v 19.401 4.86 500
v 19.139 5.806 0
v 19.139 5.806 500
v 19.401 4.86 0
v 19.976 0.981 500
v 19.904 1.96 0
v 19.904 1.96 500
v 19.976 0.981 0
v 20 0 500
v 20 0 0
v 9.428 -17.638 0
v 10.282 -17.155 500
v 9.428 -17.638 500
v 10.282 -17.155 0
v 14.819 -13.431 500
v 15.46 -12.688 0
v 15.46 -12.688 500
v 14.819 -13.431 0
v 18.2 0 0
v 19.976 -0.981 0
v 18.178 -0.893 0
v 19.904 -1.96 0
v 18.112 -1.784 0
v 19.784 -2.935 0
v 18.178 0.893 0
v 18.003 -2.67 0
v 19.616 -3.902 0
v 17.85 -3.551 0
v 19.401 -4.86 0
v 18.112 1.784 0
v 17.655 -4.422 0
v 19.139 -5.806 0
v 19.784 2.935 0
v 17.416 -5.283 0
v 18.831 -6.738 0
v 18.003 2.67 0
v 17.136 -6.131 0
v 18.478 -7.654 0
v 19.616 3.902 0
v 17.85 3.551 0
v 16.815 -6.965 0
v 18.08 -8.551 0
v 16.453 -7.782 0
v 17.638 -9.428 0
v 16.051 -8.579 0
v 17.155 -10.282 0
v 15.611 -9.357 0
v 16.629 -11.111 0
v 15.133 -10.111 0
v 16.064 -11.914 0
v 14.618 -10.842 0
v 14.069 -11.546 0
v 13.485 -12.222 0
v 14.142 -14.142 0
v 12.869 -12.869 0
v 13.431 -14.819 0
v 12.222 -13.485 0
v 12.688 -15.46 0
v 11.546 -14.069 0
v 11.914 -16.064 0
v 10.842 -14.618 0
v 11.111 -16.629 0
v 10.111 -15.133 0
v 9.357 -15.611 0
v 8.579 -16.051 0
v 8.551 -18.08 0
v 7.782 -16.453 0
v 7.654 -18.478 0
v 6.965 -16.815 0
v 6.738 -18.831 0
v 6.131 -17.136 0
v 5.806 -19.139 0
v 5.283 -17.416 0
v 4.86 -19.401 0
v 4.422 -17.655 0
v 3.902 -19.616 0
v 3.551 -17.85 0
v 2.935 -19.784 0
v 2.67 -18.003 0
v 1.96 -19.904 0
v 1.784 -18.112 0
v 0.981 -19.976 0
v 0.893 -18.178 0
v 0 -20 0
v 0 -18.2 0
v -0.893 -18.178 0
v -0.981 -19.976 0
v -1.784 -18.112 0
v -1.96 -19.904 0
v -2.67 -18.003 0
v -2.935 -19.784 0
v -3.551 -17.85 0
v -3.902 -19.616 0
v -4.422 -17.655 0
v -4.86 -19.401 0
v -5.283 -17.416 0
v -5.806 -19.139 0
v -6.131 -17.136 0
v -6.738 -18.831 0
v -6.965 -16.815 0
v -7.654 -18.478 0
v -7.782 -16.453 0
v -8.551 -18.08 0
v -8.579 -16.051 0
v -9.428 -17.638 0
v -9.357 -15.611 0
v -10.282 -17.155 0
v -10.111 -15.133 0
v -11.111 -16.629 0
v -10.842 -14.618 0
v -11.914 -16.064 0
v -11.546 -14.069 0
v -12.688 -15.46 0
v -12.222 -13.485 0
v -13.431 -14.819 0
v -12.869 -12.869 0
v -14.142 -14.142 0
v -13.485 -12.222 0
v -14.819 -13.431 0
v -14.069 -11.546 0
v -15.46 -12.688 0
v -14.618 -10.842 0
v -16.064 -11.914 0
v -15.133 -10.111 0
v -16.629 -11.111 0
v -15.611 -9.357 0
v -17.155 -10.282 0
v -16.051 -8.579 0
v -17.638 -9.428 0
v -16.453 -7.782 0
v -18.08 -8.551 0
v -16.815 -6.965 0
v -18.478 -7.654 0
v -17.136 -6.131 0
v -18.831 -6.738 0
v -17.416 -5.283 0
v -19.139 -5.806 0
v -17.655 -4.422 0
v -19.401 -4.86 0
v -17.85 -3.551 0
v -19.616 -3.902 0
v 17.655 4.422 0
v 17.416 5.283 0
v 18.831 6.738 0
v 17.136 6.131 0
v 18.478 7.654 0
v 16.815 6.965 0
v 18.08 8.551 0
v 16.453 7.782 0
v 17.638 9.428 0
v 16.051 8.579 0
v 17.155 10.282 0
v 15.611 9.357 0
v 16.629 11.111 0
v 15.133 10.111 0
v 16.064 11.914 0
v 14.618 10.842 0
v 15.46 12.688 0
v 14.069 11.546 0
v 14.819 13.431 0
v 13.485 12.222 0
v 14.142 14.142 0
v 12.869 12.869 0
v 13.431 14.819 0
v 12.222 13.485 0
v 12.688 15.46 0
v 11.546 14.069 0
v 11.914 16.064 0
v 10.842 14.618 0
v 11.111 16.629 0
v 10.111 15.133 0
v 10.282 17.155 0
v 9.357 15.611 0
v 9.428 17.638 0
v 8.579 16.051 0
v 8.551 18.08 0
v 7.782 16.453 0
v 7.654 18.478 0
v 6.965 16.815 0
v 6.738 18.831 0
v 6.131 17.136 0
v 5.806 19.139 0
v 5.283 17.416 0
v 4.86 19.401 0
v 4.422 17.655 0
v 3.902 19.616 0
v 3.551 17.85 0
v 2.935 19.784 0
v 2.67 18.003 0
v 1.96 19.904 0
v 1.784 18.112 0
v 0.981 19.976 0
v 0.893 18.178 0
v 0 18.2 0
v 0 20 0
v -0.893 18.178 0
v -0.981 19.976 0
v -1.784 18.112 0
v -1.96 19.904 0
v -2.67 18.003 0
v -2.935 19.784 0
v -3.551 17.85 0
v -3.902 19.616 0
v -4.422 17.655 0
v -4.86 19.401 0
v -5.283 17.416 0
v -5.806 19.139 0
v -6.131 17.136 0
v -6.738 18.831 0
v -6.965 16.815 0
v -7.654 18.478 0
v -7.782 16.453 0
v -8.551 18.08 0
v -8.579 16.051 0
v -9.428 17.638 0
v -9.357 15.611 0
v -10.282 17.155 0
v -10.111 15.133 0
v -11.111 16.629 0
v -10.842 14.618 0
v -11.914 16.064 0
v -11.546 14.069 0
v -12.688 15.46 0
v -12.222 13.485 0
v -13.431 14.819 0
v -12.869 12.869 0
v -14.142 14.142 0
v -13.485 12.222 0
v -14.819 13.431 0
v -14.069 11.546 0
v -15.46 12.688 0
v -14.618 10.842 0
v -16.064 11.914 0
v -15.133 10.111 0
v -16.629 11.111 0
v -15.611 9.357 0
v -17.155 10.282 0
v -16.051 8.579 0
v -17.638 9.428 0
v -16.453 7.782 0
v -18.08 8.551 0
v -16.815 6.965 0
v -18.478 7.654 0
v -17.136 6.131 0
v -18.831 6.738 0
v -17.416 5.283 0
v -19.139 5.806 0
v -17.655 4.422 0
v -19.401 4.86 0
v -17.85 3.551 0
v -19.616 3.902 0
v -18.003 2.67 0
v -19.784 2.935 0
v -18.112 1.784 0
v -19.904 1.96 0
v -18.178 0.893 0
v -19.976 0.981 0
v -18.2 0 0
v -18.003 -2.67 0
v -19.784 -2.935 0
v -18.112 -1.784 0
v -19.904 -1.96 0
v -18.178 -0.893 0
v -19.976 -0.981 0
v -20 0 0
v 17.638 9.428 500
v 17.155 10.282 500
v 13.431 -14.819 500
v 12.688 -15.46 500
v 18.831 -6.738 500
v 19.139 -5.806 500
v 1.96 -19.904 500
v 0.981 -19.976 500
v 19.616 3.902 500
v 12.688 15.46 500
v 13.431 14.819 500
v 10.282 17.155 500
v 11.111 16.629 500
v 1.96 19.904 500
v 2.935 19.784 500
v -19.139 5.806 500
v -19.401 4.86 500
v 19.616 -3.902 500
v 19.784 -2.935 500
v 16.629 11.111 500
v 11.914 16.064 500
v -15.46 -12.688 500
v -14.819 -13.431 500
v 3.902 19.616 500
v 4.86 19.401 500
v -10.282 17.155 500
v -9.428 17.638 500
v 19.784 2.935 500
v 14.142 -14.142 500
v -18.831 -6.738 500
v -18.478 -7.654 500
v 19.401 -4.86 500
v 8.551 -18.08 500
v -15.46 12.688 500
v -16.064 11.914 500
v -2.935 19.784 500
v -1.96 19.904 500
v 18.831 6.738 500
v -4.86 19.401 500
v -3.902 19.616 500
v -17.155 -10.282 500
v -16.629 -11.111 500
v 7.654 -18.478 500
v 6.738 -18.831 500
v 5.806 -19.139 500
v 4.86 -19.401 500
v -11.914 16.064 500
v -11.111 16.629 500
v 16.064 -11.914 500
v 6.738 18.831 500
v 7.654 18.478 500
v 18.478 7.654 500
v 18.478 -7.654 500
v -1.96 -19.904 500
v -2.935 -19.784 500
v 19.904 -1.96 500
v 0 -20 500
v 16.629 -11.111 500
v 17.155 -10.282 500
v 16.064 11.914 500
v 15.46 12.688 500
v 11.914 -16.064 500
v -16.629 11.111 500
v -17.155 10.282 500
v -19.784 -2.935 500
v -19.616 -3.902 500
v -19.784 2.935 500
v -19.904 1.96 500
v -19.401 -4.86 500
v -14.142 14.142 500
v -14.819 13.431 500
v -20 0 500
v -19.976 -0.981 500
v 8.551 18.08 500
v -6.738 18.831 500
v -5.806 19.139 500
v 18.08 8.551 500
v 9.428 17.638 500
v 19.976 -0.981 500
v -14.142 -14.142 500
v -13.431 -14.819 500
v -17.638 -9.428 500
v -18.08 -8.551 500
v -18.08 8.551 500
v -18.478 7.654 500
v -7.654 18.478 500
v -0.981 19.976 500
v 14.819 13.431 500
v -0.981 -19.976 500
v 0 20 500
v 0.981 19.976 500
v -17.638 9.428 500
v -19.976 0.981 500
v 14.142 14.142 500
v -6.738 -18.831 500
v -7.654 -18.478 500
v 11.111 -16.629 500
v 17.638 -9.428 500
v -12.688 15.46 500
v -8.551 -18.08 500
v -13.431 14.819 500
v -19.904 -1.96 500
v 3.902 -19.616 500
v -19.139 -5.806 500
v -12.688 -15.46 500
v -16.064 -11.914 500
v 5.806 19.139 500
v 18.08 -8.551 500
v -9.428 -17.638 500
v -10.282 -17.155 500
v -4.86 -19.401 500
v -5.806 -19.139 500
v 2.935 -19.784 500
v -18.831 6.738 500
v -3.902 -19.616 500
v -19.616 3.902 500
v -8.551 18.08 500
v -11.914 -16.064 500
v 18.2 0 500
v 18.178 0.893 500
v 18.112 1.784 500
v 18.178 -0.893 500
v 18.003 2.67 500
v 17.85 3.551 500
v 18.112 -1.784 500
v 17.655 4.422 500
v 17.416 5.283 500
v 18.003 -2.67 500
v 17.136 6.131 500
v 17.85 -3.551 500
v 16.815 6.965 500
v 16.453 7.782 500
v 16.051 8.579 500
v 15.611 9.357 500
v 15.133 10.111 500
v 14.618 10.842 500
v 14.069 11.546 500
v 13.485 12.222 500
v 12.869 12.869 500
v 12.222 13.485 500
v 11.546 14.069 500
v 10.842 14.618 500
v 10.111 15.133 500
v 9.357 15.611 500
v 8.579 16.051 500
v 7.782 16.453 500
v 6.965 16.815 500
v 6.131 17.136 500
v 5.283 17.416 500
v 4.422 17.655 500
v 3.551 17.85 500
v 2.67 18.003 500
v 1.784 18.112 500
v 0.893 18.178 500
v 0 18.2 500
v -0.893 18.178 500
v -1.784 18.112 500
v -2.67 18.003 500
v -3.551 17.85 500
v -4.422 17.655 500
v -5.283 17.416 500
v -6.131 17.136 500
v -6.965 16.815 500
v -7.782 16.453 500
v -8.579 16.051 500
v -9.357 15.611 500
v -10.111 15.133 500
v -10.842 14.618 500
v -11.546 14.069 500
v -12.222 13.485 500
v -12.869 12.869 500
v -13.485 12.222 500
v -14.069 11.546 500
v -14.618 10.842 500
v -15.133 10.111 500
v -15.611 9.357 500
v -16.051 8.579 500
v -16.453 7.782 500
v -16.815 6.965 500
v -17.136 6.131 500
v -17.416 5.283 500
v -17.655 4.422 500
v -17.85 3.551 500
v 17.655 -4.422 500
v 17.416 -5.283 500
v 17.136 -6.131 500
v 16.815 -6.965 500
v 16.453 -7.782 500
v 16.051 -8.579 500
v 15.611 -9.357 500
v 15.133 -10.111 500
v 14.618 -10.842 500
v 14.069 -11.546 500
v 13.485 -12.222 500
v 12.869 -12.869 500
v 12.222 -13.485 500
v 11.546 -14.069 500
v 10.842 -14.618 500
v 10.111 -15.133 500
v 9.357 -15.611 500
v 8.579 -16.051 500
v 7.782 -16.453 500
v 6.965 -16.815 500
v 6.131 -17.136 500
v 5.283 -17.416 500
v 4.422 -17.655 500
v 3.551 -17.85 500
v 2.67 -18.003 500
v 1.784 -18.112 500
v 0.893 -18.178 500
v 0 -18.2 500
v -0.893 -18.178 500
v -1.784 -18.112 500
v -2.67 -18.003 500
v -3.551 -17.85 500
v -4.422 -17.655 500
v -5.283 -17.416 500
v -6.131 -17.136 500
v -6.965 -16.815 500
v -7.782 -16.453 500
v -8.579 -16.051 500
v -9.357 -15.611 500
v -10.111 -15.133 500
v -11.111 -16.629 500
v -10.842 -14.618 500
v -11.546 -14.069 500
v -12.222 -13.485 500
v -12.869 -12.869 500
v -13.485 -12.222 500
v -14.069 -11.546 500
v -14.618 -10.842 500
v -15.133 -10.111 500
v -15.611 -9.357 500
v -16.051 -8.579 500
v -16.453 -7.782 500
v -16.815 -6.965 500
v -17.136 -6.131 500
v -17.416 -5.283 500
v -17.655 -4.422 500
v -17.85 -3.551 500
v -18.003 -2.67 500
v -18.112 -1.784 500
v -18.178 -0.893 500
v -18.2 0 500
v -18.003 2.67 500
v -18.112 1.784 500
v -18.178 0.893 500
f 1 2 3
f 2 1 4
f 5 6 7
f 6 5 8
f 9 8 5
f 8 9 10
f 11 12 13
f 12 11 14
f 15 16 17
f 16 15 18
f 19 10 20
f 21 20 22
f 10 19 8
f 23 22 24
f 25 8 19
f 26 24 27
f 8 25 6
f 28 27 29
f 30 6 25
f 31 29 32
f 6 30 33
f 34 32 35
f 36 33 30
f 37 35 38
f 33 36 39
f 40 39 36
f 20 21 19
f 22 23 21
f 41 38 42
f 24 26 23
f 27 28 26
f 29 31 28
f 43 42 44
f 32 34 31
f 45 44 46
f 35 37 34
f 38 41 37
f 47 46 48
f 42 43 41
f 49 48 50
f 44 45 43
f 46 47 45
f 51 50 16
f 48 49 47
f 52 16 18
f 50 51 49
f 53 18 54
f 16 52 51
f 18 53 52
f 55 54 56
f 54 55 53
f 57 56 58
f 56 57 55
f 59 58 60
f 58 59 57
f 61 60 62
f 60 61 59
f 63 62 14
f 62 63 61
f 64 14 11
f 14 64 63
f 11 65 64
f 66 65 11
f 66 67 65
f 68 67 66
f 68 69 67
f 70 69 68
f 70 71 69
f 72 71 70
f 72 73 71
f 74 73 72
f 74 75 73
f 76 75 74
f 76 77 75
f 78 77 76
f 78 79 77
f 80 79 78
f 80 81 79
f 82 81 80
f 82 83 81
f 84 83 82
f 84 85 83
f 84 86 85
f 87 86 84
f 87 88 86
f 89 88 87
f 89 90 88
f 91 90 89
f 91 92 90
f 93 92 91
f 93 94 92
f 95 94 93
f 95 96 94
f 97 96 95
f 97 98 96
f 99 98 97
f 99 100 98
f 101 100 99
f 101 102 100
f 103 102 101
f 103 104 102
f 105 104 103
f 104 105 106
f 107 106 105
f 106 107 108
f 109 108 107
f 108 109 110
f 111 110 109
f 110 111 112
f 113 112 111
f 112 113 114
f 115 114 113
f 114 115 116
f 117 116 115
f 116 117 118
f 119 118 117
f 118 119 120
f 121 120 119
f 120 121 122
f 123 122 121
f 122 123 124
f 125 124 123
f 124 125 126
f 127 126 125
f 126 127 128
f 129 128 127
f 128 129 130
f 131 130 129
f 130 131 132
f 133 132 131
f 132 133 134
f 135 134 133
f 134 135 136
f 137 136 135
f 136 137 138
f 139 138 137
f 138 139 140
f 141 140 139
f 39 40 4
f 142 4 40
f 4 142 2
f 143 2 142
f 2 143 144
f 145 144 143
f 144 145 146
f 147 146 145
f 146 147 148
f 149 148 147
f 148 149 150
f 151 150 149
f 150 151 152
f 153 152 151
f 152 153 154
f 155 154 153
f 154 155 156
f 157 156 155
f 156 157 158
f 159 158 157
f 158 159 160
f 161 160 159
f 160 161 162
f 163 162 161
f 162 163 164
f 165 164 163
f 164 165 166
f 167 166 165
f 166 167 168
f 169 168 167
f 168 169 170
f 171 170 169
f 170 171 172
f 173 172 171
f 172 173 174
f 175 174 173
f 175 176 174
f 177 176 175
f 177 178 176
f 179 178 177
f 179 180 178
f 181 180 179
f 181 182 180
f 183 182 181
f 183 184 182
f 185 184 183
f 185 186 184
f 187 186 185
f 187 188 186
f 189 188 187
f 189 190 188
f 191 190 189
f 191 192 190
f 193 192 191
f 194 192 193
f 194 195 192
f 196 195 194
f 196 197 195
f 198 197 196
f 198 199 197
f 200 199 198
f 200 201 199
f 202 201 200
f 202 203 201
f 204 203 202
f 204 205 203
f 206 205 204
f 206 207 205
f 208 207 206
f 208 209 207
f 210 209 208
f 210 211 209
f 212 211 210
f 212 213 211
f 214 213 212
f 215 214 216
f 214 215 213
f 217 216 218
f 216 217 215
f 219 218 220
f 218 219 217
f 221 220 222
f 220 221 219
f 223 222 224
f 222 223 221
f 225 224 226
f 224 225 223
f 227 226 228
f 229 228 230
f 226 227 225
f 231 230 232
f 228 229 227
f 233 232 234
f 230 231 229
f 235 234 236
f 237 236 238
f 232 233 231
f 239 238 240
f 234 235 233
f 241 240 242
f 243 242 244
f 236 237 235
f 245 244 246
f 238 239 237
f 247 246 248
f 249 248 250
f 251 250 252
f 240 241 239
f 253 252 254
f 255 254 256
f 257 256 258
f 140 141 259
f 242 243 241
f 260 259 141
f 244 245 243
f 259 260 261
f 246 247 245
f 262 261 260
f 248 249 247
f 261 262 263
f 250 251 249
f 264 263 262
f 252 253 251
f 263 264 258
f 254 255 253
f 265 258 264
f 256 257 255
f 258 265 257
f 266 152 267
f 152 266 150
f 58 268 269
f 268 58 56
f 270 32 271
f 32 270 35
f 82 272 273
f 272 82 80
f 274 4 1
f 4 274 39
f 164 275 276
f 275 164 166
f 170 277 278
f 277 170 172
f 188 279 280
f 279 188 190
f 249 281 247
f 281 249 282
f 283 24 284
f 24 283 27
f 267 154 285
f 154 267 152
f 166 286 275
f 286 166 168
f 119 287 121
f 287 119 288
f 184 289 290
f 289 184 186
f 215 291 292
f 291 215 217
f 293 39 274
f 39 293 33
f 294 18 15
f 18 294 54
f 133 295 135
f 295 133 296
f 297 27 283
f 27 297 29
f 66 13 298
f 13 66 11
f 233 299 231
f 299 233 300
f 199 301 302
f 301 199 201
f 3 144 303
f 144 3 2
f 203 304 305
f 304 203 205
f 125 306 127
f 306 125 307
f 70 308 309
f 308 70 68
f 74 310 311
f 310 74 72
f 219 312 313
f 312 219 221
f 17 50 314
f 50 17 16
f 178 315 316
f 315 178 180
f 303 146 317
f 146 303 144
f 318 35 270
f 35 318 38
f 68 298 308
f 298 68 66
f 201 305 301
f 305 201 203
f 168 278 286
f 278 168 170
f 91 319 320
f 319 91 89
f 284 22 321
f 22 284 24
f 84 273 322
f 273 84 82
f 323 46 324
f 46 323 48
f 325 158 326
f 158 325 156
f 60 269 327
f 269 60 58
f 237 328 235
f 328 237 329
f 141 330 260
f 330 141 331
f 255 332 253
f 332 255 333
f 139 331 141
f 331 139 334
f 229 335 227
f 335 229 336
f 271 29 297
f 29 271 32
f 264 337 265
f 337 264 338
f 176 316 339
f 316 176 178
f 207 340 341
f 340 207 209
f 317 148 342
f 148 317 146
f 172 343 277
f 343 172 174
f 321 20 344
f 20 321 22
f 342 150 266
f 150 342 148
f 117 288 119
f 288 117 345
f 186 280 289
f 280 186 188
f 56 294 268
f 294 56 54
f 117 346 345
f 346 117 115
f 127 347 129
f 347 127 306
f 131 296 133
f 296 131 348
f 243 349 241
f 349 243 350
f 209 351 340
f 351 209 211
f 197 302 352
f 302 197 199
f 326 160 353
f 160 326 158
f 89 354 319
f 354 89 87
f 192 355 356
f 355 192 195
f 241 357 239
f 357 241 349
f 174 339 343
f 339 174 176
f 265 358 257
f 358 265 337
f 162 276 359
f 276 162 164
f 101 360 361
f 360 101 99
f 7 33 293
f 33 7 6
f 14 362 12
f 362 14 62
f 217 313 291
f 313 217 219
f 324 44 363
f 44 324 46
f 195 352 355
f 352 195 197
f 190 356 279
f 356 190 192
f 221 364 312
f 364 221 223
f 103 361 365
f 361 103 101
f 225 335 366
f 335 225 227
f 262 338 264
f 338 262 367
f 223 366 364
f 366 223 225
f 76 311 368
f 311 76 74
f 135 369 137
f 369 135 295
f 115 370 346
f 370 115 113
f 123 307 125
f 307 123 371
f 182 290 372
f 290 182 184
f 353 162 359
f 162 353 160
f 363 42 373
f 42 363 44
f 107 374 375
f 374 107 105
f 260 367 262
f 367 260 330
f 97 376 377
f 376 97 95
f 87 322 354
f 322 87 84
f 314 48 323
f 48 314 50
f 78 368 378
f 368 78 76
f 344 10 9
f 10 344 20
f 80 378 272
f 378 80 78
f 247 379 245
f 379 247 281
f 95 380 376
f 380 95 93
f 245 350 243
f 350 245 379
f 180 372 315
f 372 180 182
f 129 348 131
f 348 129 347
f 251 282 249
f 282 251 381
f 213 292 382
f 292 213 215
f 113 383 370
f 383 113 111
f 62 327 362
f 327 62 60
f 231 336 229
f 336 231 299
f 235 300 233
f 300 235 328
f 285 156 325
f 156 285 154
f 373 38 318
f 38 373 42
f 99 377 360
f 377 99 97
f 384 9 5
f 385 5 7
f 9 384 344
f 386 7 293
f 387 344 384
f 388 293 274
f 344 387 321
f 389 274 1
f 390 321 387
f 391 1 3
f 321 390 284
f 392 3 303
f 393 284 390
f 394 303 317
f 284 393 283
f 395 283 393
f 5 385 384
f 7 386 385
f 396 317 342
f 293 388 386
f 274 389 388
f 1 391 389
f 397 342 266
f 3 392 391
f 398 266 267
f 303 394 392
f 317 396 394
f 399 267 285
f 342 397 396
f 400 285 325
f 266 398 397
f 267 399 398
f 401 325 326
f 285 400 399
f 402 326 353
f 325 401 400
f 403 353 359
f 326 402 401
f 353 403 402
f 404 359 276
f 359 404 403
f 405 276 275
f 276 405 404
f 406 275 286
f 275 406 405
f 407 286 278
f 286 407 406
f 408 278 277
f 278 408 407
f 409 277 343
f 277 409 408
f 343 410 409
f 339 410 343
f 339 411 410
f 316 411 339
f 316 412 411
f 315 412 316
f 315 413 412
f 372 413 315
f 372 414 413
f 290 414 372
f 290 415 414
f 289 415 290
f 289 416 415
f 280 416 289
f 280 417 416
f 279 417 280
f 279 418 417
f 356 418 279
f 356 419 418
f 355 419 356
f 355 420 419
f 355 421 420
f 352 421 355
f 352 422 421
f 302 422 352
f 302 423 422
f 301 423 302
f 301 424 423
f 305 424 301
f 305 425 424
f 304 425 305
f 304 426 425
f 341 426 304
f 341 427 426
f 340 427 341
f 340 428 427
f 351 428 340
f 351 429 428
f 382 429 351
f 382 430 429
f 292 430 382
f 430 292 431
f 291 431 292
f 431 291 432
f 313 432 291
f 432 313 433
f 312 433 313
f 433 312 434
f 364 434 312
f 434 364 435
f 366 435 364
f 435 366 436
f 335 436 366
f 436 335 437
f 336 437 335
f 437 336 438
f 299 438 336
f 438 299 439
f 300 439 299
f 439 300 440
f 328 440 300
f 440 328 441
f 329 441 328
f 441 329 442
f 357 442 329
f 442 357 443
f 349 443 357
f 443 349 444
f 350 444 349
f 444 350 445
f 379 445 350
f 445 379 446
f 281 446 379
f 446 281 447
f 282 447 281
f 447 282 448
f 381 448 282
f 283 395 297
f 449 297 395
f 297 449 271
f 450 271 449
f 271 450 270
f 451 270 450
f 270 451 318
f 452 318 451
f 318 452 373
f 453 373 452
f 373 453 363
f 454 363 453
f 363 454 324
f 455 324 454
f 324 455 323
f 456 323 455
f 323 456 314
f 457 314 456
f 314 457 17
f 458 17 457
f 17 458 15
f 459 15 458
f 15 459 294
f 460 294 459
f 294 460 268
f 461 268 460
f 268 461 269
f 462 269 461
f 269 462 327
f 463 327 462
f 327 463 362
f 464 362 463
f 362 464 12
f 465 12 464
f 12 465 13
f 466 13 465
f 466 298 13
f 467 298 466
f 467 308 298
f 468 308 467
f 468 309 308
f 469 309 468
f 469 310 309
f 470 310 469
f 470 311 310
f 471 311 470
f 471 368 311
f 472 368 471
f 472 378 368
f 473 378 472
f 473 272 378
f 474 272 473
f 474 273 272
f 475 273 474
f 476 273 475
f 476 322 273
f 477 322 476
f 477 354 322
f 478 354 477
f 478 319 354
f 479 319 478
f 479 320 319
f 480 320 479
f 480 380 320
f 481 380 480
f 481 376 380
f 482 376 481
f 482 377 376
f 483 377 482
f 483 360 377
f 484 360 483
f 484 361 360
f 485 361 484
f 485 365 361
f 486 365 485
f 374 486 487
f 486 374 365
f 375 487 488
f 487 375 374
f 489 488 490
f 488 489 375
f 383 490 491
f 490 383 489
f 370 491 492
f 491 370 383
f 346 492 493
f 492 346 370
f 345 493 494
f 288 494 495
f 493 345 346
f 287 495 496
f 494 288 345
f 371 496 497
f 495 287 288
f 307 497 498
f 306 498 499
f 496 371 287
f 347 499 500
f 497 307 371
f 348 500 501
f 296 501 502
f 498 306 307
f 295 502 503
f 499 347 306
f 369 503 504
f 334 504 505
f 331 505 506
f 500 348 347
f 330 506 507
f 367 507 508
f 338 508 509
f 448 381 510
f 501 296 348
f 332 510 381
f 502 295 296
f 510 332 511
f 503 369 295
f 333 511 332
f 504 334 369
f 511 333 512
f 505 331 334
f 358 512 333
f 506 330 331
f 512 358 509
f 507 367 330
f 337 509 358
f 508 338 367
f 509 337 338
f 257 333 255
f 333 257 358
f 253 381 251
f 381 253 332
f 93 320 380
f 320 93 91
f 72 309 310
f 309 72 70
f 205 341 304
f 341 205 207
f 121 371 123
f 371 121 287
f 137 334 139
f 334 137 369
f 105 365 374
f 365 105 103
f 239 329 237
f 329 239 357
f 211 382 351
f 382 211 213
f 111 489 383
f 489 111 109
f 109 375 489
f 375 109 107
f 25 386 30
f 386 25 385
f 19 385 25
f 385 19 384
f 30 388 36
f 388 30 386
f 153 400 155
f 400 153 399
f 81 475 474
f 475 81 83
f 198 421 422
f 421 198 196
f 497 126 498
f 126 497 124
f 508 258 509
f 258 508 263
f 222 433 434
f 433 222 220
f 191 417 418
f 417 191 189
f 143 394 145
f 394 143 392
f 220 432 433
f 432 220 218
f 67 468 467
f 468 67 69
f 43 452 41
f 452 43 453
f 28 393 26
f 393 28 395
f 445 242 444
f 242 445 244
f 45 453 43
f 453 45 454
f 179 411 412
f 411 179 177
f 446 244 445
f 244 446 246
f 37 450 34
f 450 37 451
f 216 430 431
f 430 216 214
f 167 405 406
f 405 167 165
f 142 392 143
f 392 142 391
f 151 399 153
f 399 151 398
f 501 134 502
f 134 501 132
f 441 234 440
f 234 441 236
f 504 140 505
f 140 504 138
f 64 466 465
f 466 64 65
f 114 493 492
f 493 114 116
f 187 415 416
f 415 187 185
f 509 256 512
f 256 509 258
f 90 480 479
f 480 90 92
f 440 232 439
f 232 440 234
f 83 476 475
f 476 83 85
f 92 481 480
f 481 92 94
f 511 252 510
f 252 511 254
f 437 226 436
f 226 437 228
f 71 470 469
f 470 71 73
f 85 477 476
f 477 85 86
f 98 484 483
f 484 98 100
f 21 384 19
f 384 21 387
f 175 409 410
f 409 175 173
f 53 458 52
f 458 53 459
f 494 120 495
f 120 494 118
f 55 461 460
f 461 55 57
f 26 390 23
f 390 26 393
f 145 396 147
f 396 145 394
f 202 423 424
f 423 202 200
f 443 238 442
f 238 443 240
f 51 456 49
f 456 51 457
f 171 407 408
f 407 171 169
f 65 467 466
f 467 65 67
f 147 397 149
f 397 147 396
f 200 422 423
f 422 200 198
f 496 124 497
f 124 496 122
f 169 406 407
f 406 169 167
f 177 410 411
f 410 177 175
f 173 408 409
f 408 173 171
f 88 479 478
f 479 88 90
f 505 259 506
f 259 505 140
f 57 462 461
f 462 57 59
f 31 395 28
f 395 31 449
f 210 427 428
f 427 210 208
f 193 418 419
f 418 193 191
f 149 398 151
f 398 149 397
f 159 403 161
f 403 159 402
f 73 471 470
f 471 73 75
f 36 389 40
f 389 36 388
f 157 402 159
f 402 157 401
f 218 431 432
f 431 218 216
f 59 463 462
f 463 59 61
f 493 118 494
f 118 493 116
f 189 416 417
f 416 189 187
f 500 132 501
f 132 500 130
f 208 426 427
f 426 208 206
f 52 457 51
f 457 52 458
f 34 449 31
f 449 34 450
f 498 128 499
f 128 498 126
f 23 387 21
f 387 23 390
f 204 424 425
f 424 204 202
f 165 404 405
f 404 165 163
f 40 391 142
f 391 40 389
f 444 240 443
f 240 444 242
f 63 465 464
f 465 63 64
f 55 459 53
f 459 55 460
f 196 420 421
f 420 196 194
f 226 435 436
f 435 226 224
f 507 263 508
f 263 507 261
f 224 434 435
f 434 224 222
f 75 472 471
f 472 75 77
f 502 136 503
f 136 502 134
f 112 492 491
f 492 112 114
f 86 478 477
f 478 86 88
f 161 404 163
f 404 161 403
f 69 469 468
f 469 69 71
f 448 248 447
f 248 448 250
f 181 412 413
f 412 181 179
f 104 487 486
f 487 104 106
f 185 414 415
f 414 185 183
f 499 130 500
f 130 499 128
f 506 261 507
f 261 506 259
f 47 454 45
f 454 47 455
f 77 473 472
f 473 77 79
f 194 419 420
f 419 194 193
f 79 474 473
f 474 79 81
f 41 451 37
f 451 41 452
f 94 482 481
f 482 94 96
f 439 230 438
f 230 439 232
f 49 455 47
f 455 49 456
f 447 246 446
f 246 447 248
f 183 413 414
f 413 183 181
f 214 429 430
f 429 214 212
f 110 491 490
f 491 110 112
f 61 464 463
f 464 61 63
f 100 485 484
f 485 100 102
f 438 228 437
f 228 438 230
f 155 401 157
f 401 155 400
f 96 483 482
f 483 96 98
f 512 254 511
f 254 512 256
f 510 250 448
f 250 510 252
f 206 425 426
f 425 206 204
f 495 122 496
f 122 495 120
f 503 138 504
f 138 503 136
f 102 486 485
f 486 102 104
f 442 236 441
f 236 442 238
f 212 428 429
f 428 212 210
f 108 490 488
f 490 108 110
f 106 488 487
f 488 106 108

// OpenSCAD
$fn = 128;

// HT 40 pipe (approx.): DN40, OD 40 mm, typical wall ~1.8 mm
pipe_length = 500;      // mm
outer_diameter = 40;    // mm
wall_thickness = 1.8;   // mm

inner_diameter = outer_diameter - 2 * wall_thickness;

difference() {
    cylinder(h = pipe_length, d = outer_diameter, center = false);
    translate([0, 0, -0.1])
        cylinder(h = pipe_length + 0.2, d = inner_diameter, center = false);
}
